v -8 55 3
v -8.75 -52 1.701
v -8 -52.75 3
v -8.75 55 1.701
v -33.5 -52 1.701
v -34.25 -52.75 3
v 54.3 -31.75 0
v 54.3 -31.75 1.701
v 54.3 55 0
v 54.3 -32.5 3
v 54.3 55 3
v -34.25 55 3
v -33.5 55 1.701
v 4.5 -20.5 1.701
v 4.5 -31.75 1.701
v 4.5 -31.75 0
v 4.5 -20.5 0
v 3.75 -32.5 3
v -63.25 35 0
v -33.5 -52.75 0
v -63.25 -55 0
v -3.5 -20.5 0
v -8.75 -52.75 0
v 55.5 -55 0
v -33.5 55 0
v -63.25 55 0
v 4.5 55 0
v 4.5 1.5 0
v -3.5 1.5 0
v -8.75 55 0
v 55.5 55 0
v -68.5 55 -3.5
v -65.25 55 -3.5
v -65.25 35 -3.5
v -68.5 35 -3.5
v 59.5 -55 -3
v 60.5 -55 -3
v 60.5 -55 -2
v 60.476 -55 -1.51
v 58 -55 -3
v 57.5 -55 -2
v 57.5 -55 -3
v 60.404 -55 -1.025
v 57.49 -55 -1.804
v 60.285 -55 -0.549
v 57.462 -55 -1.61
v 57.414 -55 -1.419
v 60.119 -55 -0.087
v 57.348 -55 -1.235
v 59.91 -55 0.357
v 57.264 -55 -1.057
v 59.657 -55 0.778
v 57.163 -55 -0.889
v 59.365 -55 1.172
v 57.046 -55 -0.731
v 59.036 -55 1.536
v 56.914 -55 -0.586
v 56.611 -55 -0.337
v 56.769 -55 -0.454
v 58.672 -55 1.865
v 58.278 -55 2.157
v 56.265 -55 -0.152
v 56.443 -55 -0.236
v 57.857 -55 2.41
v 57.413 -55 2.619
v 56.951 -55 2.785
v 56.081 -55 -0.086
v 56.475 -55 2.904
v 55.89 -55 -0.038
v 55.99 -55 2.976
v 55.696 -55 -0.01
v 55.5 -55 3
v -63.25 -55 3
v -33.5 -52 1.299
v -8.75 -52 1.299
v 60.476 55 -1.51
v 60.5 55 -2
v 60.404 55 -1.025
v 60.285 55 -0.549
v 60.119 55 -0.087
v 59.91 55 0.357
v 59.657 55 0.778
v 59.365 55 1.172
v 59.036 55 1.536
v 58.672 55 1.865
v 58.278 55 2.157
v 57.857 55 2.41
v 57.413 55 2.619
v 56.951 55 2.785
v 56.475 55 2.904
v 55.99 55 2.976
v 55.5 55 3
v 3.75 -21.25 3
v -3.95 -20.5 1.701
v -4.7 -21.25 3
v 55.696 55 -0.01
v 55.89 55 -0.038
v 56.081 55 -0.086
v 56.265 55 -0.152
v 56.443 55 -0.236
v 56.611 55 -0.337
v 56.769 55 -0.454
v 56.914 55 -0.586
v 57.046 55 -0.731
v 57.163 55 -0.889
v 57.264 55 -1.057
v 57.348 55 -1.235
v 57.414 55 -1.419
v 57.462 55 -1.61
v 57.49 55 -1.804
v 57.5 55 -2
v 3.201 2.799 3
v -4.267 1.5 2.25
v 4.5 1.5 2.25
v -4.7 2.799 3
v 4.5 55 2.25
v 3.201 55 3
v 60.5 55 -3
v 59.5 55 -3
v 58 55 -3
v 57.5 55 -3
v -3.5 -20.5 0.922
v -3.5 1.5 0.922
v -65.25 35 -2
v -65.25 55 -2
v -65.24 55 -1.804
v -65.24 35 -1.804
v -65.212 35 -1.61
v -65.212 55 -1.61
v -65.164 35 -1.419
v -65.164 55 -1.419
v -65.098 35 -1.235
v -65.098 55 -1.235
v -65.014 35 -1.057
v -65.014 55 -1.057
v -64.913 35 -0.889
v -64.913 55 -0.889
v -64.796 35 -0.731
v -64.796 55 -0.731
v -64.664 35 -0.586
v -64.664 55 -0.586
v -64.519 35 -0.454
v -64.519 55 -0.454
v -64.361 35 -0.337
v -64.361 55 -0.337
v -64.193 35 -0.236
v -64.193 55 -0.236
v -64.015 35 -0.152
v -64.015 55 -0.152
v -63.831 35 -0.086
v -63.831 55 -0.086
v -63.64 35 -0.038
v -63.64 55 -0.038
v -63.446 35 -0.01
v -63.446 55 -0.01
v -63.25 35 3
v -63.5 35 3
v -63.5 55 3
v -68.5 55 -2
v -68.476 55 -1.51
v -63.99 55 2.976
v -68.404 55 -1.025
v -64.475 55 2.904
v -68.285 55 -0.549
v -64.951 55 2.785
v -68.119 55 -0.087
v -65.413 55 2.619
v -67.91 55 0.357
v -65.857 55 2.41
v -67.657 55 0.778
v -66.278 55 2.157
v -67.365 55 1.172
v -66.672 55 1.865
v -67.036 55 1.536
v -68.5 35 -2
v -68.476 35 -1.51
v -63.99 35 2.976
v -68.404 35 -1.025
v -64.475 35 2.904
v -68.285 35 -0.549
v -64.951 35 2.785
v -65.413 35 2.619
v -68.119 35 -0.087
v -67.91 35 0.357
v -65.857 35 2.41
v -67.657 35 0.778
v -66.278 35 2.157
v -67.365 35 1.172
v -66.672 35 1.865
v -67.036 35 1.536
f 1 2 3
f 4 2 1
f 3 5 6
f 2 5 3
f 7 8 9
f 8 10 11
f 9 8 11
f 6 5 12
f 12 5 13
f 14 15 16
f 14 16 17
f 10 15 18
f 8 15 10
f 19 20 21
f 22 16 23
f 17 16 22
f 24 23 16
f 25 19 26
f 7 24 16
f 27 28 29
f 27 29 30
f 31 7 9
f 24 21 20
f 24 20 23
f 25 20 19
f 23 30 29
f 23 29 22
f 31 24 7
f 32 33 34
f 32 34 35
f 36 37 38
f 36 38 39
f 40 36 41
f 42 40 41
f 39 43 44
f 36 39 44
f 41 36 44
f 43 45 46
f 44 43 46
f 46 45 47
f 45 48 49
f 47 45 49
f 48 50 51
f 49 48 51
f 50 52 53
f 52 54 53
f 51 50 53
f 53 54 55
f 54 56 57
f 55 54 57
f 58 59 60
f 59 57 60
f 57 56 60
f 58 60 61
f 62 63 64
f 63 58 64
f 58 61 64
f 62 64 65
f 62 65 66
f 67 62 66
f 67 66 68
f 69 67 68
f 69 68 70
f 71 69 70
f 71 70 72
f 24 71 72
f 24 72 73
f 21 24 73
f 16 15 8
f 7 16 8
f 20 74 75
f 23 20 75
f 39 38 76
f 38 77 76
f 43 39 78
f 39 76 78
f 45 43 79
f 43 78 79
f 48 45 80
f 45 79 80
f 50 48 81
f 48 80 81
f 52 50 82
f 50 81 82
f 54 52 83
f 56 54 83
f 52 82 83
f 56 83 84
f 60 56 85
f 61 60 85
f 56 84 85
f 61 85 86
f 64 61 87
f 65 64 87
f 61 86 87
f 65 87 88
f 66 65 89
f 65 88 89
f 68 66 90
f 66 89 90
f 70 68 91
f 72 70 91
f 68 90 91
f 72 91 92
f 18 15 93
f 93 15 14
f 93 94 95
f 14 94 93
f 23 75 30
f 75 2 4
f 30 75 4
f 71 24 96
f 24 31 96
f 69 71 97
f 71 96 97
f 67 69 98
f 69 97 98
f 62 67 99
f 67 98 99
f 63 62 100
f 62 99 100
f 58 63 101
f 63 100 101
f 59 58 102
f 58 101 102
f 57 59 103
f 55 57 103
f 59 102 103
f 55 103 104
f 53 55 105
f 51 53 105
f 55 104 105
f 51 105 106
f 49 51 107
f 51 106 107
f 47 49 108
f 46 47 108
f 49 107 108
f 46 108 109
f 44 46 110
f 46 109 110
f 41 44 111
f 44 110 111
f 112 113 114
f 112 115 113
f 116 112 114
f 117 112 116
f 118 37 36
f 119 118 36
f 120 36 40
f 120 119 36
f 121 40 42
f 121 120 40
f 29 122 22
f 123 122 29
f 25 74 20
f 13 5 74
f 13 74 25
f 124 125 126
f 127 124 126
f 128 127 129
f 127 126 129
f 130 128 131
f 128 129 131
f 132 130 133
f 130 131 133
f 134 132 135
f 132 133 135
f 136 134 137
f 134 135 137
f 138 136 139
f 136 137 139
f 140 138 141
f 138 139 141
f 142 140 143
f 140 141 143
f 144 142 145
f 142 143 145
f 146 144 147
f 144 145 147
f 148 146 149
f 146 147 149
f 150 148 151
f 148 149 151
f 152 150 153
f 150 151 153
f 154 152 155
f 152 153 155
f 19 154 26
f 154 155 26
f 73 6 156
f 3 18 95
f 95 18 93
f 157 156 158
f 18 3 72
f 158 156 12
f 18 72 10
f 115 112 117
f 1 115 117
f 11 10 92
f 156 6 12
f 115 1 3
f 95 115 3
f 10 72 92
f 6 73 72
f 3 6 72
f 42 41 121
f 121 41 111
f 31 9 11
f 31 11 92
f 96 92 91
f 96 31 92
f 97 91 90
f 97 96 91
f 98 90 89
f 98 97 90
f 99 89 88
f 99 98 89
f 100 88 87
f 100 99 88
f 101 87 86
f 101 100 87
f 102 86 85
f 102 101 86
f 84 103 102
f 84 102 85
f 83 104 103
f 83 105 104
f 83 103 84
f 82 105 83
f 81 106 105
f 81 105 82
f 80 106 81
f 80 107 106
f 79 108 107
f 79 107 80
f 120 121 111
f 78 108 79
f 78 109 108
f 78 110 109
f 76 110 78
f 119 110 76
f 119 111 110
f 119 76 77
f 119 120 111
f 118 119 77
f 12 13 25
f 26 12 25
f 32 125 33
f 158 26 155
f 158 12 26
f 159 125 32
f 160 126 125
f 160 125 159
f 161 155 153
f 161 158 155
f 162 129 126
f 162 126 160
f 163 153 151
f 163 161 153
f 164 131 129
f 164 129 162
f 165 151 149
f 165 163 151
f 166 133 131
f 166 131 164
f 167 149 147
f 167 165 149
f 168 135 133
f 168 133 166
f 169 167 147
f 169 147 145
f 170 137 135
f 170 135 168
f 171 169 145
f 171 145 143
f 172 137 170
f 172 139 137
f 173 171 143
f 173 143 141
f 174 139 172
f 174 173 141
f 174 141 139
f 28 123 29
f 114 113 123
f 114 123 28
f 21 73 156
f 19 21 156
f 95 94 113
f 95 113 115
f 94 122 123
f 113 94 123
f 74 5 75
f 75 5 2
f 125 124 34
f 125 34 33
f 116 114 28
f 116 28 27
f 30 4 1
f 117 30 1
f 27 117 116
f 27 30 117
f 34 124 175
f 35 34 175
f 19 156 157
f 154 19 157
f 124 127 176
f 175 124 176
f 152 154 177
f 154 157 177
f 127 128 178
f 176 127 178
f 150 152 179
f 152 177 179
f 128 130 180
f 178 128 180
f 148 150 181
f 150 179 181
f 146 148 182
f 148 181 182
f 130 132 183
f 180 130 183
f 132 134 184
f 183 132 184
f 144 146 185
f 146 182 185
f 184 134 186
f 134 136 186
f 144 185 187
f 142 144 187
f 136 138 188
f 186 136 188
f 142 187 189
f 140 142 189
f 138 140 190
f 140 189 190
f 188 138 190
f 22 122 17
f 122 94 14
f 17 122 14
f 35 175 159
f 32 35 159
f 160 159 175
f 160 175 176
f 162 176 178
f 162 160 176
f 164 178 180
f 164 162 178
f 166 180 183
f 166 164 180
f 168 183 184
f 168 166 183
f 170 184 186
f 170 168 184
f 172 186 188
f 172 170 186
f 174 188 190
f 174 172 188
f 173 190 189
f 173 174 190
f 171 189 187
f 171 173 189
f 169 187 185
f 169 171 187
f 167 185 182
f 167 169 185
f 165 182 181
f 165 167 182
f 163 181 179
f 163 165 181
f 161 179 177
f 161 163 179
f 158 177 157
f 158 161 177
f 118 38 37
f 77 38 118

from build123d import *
from OCP.BRepFilletAPI import BRepFilletAPI_MakeChamfer

# Parameters (mm, degrees)
SKETCH1_W           = 121
SKETCH1_H           = 110
BOSS_EXTRUDE1_DEPTH = 3
SKETCH8_W           = 3
SKETCH8_H           = 110
BOSS_EXTRUDE5_DEPTH = 3
FILLET4_R           = 2
FILLET5_R           = 5
SKETCH9_W           = 1
SKETCH9_H           = 110
BOSS_EXTRUDE6_DEPTH = 2.5
BOSS_EXTRUDE7_DEPTH = 110
SKETCH11_W          = 24.75
SKETCH11_H          = 107
SKETCH11_W_2        = 49.8
SKETCH11_H_2        = 86.75
CUT_EXTRUDE1_DEPTH  = 3
CHAMFER1_SIZE       = 0.75
CHAMFER1_SIZE2      = 1.299038106
CHAMFER2_SIZE       = 0.75
CHAMFER2_SIZE2      = 1.299038106
SKETCH13_W          = 8
SKETCH13_H          = 22
CUT_EXTRUDE4_DEPTH  = 3
CHAMFER3_SIZE       = 0.75
CHAMFER3_SIZE2      = 1.299038106
CHAMFER4_SIZE       = 1.2
CHAMFER4_SIZE2      = 2.078460969
SKETCH14_W          = 3
SKETCH14_H          = 110
BOSS_EXTRUDE8_DEPTH = 8
SKETCH15_W          = 3.25
SKETCH15_H          = 110
BOSS_EXTRUDE9_DEPTH = 3.5
FILLET6_R           = 2
FILLET7_R           = 5
CUT_EXTRUDE5_START  = -6.5
SKETCH17_W          = 5.25
SKETCH17_H          = 90
CUT_EXTRUDE5_DEPTH  = 6.5
SKETCH18_W          = 3
SKETCH18_H          = 5.101072491
CUT_EXTRUDE6_DEPTH  = 110


with BuildPart() as part:
    # Sketch1 → Boss-Extrude1 (new body)
    with BuildSketch(Plane.XY):
        Rectangle(SKETCH1_W, SKETCH1_H)
    extrude(amount=BOSS_EXTRUDE1_DEPTH)

    # Sketch8 → Boss-Extrude5 (add)
    with BuildSketch(Plane(origin=(0, 0, 0), x_dir=(-1, 0, 0), z_dir=(0, 0, -1))):
        with Locations((-59, 0)):
            Rectangle(SKETCH8_W, SKETCH8_H)
    extrude(amount=BOSS_EXTRUDE5_DEPTH)

    # Fillet4
    fillet4_edges = [part.edges().sort_by_distance(p)[0] for p in [
        (57.5, 0, 0),
    ]]
    fillet(fillet4_edges, radius=FILLET4_R)

    # Fillet5
    fillet5_edges = [part.edges().sort_by_distance(p)[0] for p in [
        (60.5, 0, 3),
    ]]
    fillet(fillet5_edges, radius=FILLET5_R)

    # Sketch9 → Boss-Extrude6 (add)
    with BuildSketch(Plane(origin=(0, 0, -3), x_dir=(-1, 0, 0), z_dir=(0, 0, -1))):
        with Locations((-59, 0)):
            Rectangle(SKETCH9_W, SKETCH9_H)
    extrude(amount=BOSS_EXTRUDE6_DEPTH)

    # Sketch10 → Boss-Extrude7 (add, through all)
    with BuildSketch(Plane(origin=(0, 55, 0), x_dir=(1, 0, 0), z_dir=(0, 1, 0))):
        Polygon((58.5, 5.5), (58, 3), (58.5, 3), align=None)
    extrude(amount=-BOSS_EXTRUDE7_DEPTH)

    # Sketch11 → Cut-Extrude1 (cut)
    with BuildSketch(Plane.XY.offset(3)):
        with Locations((-21.125, 1.5)):
            Rectangle(SKETCH11_W, SKETCH11_H)
        with Locations((29.4, 11.625)):
            Rectangle(SKETCH11_W_2, SKETCH11_H_2)
    extrude(amount=-CUT_EXTRUDE1_DEPTH, mode=Mode.SUBTRACT)

    # Chamfer1
    chamfer1_edges = [part.edges().sort_by_distance(p)[0] for p in [
        (-33.5, 1.5, 3),
        (-21.125, -52, 3),
        (-8.75, 1.5, 3),
    ]]
    chamfer1_side = [part.faces().sort_by_distance(p)[0] for p in [
        (-58.901375591, 0, 3),
    ]]
    chamfer(chamfer1_edges, length=CHAMFER1_SIZE, length2=CHAMFER1_SIZE2, reference=chamfer1_side[0])

    # Chamfer2
    chamfer2_edges = [part.edges().sort_by_distance(p)[0] for p in [
        (-21.125, -52, 0),
    ]]
    chamfer2_side = [part.faces().sort_by_distance(p)[0] for p in [
        (55.340137559, 0, 0),
    ]]
    chamfer(chamfer2_edges, length=CHAMFER2_SIZE, length2=CHAMFER2_SIZE2, reference=chamfer2_side[0])

    # Sketch13 → Cut-Extrude4 (cut)
    with BuildSketch(Plane.XY.offset(3)):
        with Locations((0.5, -9.5)):
            Rectangle(SKETCH13_W, SKETCH13_H)
    extrude(amount=-CUT_EXTRUDE4_DEPTH, mode=Mode.SUBTRACT)

    # Chamfer3: one chamfer whose edges measure the first distance from different faces: ONE call of the kernel's chamfer builder (chamfer() names one face for all edges)
    chamfer3_edges_1 = [part.edges().sort_by_distance(p)[0] for p in [
        (4.5, -26.125, 3),
        (0.5, -20.5, 3),
        (29.4, -31.75, 3),
    ]]
    chamfer3_side_1 = [part.faces().sort_by_distance(p)[0] for p in [
        (-6.401375591, 1.125, 3),
    ]]
    chamfer3_edges_2 = [part.edges().sort_by_distance(p)[0] for p in [
        (0.5, 1.5, 3),
    ]]
    chamfer3_side_2 = [part.faces().sort_by_distance(p)[0] for p in [
        (0.5, 1.5, 1.5),
    ]]
    chamfer3_edges_3 = [part.edges().sort_by_distance(p)[0] for p in [
        (4.5, 28.25, 3),
    ]]
    chamfer3_side_3 = [part.faces().sort_by_distance(p)[0] for p in [
        (4.5, 28.25, 1.5),
    ]]
    chamfer3 = BRepFilletAPI_MakeChamfer(part.part.solid().wrapped)
    for e in chamfer3_edges_1:
        chamfer3.Add(CHAMFER3_SIZE, CHAMFER3_SIZE2, e.wrapped, chamfer3_side_1[0].wrapped)  # the first distance lies on this face
    for e in chamfer3_edges_2:
        chamfer3.Add(CHAMFER3_SIZE, CHAMFER3_SIZE2, e.wrapped, chamfer3_side_2[0].wrapped)  # the first distance lies on this face
    for e in chamfer3_edges_3:
        chamfer3.Add(CHAMFER3_SIZE, CHAMFER3_SIZE2, e.wrapped, chamfer3_side_3[0].wrapped)  # the first distance lies on this face
    add(Compound.cast(chamfer3.Shape()), mode=Mode.REPLACE)

    # Chamfer4
    chamfer4_edges = [part.edges().sort_by_distance(p)[0] for p in [
        (-3.5, -9.225480947, 3),
    ]]
    chamfer4_side = [part.faces().sort_by_distance(p)[0] for p in [
        (-2.399519053, 53.401375591, 3),
    ]]
    chamfer(chamfer4_edges, length=CHAMFER4_SIZE, length2=CHAMFER4_SIZE2, reference=chamfer4_side[0])

    # Sketch14 → Boss-Extrude8 (add)
    with BuildSketch(Plane.ZY.offset(60.5)):
        with Locations((1.5, 0)):
            Rectangle(SKETCH14_W, SKETCH14_H)
    extrude(amount=BOSS_EXTRUDE8_DEPTH)

    # Sketch15 → Boss-Extrude9 (add)
    with BuildSketch(Plane(origin=(0, 0, 0), x_dir=(-1, 0, 0), z_dir=(0, 0, -1))):
        with Locations((66.875, 0)):
            Rectangle(SKETCH15_W, SKETCH15_H)
    extrude(amount=BOSS_EXTRUDE9_DEPTH)

    # Fillet6
    fillet6_edges = [part.edges().sort_by_distance(p)[0] for p in [
        (-65.25, 0, 0),
    ]]
    fillet(fillet6_edges, radius=FILLET6_R)

    # Fillet7
    fillet7_edges = [part.edges().sort_by_distance(p)[0] for p in [
        (-68.5, 0, 3),
    ]]
    fillet(fillet7_edges, radius=FILLET7_R)

    # Sketch17 → Cut-Extrude5 (cut)
    with BuildSketch(Plane(origin=(0, 0, -3.5), x_dir=(-1, 0, 0), z_dir=(0, 0, -1)).offset(CUT_EXTRUDE5_START)):
        with Locations((65.875, -10)):
            Rectangle(SKETCH17_W, SKETCH17_H)
    extrude(amount=CUT_EXTRUDE5_DEPTH, mode=Mode.SUBTRACT)

    # Sketch18 → Cut-Extrude6 (cut)
    with BuildSketch(Plane(origin=(0, 55, 0), x_dir=(1, 0, 0), z_dir=(0, 1, 0))):
        with Locations((59, 5.550536246)):
            Rectangle(SKETCH18_W, SKETCH18_H)
    extrude(amount=-CUT_EXTRUDE6_DEPTH, mode=Mode.SUBTRACT)


solid = part.part
